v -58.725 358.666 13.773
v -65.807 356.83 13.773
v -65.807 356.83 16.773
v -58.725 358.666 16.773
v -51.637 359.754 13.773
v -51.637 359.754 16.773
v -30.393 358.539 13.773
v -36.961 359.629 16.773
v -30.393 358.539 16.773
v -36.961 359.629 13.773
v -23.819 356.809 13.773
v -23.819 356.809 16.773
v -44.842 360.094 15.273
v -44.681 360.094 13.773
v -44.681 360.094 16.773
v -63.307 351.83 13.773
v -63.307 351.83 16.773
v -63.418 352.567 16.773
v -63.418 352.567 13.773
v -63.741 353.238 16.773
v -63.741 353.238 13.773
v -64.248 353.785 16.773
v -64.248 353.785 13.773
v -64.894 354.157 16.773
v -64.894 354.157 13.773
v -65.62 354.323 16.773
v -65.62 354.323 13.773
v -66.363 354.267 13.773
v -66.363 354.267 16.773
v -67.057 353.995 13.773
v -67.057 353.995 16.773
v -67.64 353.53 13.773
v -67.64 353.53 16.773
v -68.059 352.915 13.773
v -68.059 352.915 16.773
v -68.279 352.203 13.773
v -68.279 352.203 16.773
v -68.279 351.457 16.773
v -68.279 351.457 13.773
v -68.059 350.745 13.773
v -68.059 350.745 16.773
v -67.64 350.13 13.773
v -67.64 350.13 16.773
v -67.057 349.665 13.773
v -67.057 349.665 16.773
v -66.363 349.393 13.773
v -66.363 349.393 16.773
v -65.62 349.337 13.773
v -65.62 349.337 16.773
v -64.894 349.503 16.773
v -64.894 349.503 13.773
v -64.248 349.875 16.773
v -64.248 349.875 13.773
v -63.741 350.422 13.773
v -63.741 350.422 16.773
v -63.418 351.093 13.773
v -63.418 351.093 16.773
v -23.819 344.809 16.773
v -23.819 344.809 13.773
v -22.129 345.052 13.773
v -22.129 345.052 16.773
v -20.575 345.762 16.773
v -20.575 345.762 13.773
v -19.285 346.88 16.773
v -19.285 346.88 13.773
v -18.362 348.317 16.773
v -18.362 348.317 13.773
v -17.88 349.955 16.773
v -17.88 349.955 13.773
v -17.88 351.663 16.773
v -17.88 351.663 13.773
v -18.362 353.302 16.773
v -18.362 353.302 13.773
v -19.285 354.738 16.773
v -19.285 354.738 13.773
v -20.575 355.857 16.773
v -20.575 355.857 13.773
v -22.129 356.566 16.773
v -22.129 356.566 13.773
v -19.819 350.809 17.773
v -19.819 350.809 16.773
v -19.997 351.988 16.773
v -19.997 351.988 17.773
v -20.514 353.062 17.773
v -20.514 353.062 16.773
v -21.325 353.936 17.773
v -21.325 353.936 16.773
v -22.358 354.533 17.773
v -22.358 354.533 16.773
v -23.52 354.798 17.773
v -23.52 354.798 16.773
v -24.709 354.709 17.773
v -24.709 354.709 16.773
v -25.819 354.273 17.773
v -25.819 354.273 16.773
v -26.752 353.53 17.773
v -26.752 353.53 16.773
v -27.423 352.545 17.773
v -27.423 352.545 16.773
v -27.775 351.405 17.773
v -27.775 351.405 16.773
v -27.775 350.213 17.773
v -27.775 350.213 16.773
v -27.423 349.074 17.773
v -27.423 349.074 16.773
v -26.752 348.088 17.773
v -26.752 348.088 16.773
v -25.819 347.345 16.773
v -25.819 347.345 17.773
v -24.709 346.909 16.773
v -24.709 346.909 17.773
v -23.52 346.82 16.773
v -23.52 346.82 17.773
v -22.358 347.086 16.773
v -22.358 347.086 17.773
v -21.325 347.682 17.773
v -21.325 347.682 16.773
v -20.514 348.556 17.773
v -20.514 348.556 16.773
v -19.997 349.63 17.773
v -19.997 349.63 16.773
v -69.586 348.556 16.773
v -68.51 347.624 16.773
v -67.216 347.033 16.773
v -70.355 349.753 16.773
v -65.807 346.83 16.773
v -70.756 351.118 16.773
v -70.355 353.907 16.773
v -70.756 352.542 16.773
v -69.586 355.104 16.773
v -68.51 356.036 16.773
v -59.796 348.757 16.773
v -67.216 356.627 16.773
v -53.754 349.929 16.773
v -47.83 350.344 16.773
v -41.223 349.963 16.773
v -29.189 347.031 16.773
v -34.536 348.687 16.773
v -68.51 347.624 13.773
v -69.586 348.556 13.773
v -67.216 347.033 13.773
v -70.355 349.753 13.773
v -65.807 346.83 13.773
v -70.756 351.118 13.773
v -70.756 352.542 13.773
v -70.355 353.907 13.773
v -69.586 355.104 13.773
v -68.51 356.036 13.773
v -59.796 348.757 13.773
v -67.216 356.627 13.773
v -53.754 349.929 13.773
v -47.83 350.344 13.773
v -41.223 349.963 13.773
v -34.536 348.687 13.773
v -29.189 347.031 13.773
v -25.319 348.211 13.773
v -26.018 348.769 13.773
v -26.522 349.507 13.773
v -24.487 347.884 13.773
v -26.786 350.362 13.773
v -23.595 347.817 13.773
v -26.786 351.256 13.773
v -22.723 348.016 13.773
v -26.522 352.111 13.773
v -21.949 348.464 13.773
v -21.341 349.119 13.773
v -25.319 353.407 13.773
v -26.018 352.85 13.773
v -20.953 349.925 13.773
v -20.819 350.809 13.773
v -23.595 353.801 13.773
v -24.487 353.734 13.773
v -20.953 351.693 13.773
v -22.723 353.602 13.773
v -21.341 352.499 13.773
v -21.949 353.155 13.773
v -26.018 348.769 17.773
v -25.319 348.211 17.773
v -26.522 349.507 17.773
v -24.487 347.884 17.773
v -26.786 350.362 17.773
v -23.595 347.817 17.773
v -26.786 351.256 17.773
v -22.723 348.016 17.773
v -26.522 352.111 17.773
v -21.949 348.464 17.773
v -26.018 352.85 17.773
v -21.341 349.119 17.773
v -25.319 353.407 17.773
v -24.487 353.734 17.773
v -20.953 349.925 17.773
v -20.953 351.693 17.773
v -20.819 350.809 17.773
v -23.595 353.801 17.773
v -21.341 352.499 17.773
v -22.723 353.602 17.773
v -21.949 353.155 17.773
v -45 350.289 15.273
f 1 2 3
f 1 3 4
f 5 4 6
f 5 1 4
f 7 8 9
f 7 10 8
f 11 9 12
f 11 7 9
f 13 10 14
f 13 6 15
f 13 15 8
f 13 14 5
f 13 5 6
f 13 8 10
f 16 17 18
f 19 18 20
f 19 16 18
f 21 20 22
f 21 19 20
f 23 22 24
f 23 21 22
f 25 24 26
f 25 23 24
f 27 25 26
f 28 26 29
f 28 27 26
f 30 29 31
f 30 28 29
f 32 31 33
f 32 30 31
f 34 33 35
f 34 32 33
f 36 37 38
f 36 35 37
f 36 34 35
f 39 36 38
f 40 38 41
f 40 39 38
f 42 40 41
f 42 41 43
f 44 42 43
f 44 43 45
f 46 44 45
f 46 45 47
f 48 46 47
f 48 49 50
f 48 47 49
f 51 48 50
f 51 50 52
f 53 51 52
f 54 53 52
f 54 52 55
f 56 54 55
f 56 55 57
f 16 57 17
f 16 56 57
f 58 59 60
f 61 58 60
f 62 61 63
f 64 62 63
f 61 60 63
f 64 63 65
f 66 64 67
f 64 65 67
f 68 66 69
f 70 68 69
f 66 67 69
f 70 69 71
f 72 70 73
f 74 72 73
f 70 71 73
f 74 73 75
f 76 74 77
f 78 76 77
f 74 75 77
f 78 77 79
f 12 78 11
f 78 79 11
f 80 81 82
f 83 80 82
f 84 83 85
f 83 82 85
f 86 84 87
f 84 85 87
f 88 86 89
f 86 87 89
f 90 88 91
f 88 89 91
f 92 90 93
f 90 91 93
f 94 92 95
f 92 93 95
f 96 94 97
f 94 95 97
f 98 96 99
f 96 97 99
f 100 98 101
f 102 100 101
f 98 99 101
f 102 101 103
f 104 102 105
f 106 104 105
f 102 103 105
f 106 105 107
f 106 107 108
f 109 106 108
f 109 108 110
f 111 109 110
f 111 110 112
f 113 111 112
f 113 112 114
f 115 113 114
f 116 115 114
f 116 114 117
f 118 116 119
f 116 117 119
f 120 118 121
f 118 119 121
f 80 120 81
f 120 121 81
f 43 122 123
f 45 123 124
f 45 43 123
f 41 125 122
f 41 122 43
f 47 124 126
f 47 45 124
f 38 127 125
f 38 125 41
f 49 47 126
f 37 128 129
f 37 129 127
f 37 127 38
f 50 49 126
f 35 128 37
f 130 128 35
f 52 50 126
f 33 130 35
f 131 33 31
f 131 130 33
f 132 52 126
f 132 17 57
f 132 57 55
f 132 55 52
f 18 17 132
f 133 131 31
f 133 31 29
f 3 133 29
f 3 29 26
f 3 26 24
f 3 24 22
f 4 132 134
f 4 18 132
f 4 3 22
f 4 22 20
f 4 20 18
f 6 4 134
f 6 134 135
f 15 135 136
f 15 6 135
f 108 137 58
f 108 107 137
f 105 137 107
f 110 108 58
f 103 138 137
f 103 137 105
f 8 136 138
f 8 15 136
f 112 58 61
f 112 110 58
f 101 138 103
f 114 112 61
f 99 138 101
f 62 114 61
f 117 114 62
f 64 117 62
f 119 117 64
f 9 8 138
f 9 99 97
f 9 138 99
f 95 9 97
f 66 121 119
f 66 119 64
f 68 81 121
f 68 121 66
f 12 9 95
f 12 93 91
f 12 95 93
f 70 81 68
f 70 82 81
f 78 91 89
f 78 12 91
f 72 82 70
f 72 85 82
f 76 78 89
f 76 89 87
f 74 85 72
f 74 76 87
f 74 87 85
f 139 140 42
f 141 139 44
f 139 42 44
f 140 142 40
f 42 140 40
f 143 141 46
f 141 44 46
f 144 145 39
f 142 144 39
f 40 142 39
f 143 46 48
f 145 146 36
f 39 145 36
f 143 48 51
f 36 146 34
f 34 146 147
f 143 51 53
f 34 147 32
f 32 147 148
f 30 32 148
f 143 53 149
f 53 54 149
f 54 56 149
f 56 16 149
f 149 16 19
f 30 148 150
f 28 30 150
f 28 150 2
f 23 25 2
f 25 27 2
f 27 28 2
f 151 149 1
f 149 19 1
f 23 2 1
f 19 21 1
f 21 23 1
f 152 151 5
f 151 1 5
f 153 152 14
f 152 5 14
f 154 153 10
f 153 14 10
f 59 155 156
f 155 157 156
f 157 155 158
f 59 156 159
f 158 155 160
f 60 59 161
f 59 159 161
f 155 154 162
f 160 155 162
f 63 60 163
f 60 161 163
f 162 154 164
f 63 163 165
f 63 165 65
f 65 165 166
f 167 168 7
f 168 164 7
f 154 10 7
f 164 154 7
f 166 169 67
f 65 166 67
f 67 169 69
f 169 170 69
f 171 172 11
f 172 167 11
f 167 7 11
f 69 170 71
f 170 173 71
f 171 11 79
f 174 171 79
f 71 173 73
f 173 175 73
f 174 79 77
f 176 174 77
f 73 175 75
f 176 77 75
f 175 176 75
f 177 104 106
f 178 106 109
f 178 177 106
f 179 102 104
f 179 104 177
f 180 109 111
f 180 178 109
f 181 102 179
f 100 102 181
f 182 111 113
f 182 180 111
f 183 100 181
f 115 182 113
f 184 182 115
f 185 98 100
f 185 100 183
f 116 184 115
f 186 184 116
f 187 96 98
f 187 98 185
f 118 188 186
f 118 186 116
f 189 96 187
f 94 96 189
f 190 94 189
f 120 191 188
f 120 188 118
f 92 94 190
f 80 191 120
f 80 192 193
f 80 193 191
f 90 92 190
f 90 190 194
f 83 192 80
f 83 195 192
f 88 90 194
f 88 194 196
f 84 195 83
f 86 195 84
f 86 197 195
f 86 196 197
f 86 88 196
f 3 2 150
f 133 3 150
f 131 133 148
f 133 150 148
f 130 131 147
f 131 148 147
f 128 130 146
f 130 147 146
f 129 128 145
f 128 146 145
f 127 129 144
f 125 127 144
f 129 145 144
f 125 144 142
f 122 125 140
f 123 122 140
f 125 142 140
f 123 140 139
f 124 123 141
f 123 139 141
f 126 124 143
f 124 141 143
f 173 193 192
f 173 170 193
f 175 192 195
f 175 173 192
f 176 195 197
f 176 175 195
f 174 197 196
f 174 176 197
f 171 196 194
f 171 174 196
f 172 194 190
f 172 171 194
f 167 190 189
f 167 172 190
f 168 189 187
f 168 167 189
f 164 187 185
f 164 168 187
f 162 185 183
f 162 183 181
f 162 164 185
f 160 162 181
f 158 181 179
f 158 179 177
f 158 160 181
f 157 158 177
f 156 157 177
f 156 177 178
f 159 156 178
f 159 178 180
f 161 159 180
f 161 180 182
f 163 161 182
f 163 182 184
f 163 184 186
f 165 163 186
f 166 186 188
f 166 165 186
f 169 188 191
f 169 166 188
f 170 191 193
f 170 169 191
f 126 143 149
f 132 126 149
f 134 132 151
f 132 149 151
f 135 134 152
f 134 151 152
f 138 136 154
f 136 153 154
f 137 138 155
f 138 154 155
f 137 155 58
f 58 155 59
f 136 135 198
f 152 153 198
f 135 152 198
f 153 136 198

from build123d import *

# Parameters (mm, degrees)
BOSS_EXTRUDE1_DEPTH = 30
SKETCH2_R           = 25
SKETCH2_R_2         = 30
CUT_EXTRUDE1_DEPTH  = 527.798524366
SKETCH4_R           = 40
SKETCH4_R_2         = 30
BOSS_EXTRUDE3_DEPTH = 10
SCALE1_SCALE        = 0.1


with BuildPart() as part:
    # Sketch1 → Boss-Extrude1 (new body)
    with BuildSketch(Plane.XY):
        with BuildLine():
            ThreePointArc((-267.733324074, 386.480114093), (-317.733324074, 336.480114093), (-267.733324074, 286.480114093))
            add(Edge.make_bspline(
                [(-267.733324074, 286.480114093), (-61.536299878, 365.758634067), (152.142574227, 266.270803333)],
                knots=[0, 0, 0, 1, 1, 1], degree=2))
            ThreePointArc((152.142574227, 266.270803333), (212.142574227, 326.270803333), (152.142574227, 386.270803333))
            add(Edge.make_bspline(
                [(-267.733324074, 386.480114093), (-58.376892778, 451.86591416), (152.142574227, 386.270803333)],
                knots=[0, 0, 0, 1, 1, 1], degree=2))
        make_face()
    extrude(amount=BOSS_EXTRUDE1_DEPTH)

    # Sketch2 → Cut-Extrude1 (cut, through all)
    with BuildSketch(Plane.XY):
        with Locations((-267.733324074, 336.480114093)):
            Circle(SKETCH2_R)
        with Locations((152.142574227, 326.270803333)):
            Circle(SKETCH2_R_2)
    extrude(amount=CUT_EXTRUDE1_DEPTH, mode=Mode.SUBTRACT)

    # Sketch4 → Boss-Extrude3 (add)
    with BuildSketch(Plane.XY.offset(30)):
        with Locations((152.142574227, 326.270803333)):
            Circle(SKETCH4_R)
        with Locations((152.142574227, 326.270803333)):
            Circle(SKETCH4_R_2, mode=Mode.SUBTRACT)
    extrude(amount=BOSS_EXTRUDE3_DEPTH)


with BuildPart() as part_1:
    # Scale1: scaled about (-43.370651933, 353.535569424, 15.302961692)
    add(part.part.scale(SCALE1_SCALE).moved(Location((-39.03358674, 318.182012482, 13.772665523))))


solid = part_1.part
